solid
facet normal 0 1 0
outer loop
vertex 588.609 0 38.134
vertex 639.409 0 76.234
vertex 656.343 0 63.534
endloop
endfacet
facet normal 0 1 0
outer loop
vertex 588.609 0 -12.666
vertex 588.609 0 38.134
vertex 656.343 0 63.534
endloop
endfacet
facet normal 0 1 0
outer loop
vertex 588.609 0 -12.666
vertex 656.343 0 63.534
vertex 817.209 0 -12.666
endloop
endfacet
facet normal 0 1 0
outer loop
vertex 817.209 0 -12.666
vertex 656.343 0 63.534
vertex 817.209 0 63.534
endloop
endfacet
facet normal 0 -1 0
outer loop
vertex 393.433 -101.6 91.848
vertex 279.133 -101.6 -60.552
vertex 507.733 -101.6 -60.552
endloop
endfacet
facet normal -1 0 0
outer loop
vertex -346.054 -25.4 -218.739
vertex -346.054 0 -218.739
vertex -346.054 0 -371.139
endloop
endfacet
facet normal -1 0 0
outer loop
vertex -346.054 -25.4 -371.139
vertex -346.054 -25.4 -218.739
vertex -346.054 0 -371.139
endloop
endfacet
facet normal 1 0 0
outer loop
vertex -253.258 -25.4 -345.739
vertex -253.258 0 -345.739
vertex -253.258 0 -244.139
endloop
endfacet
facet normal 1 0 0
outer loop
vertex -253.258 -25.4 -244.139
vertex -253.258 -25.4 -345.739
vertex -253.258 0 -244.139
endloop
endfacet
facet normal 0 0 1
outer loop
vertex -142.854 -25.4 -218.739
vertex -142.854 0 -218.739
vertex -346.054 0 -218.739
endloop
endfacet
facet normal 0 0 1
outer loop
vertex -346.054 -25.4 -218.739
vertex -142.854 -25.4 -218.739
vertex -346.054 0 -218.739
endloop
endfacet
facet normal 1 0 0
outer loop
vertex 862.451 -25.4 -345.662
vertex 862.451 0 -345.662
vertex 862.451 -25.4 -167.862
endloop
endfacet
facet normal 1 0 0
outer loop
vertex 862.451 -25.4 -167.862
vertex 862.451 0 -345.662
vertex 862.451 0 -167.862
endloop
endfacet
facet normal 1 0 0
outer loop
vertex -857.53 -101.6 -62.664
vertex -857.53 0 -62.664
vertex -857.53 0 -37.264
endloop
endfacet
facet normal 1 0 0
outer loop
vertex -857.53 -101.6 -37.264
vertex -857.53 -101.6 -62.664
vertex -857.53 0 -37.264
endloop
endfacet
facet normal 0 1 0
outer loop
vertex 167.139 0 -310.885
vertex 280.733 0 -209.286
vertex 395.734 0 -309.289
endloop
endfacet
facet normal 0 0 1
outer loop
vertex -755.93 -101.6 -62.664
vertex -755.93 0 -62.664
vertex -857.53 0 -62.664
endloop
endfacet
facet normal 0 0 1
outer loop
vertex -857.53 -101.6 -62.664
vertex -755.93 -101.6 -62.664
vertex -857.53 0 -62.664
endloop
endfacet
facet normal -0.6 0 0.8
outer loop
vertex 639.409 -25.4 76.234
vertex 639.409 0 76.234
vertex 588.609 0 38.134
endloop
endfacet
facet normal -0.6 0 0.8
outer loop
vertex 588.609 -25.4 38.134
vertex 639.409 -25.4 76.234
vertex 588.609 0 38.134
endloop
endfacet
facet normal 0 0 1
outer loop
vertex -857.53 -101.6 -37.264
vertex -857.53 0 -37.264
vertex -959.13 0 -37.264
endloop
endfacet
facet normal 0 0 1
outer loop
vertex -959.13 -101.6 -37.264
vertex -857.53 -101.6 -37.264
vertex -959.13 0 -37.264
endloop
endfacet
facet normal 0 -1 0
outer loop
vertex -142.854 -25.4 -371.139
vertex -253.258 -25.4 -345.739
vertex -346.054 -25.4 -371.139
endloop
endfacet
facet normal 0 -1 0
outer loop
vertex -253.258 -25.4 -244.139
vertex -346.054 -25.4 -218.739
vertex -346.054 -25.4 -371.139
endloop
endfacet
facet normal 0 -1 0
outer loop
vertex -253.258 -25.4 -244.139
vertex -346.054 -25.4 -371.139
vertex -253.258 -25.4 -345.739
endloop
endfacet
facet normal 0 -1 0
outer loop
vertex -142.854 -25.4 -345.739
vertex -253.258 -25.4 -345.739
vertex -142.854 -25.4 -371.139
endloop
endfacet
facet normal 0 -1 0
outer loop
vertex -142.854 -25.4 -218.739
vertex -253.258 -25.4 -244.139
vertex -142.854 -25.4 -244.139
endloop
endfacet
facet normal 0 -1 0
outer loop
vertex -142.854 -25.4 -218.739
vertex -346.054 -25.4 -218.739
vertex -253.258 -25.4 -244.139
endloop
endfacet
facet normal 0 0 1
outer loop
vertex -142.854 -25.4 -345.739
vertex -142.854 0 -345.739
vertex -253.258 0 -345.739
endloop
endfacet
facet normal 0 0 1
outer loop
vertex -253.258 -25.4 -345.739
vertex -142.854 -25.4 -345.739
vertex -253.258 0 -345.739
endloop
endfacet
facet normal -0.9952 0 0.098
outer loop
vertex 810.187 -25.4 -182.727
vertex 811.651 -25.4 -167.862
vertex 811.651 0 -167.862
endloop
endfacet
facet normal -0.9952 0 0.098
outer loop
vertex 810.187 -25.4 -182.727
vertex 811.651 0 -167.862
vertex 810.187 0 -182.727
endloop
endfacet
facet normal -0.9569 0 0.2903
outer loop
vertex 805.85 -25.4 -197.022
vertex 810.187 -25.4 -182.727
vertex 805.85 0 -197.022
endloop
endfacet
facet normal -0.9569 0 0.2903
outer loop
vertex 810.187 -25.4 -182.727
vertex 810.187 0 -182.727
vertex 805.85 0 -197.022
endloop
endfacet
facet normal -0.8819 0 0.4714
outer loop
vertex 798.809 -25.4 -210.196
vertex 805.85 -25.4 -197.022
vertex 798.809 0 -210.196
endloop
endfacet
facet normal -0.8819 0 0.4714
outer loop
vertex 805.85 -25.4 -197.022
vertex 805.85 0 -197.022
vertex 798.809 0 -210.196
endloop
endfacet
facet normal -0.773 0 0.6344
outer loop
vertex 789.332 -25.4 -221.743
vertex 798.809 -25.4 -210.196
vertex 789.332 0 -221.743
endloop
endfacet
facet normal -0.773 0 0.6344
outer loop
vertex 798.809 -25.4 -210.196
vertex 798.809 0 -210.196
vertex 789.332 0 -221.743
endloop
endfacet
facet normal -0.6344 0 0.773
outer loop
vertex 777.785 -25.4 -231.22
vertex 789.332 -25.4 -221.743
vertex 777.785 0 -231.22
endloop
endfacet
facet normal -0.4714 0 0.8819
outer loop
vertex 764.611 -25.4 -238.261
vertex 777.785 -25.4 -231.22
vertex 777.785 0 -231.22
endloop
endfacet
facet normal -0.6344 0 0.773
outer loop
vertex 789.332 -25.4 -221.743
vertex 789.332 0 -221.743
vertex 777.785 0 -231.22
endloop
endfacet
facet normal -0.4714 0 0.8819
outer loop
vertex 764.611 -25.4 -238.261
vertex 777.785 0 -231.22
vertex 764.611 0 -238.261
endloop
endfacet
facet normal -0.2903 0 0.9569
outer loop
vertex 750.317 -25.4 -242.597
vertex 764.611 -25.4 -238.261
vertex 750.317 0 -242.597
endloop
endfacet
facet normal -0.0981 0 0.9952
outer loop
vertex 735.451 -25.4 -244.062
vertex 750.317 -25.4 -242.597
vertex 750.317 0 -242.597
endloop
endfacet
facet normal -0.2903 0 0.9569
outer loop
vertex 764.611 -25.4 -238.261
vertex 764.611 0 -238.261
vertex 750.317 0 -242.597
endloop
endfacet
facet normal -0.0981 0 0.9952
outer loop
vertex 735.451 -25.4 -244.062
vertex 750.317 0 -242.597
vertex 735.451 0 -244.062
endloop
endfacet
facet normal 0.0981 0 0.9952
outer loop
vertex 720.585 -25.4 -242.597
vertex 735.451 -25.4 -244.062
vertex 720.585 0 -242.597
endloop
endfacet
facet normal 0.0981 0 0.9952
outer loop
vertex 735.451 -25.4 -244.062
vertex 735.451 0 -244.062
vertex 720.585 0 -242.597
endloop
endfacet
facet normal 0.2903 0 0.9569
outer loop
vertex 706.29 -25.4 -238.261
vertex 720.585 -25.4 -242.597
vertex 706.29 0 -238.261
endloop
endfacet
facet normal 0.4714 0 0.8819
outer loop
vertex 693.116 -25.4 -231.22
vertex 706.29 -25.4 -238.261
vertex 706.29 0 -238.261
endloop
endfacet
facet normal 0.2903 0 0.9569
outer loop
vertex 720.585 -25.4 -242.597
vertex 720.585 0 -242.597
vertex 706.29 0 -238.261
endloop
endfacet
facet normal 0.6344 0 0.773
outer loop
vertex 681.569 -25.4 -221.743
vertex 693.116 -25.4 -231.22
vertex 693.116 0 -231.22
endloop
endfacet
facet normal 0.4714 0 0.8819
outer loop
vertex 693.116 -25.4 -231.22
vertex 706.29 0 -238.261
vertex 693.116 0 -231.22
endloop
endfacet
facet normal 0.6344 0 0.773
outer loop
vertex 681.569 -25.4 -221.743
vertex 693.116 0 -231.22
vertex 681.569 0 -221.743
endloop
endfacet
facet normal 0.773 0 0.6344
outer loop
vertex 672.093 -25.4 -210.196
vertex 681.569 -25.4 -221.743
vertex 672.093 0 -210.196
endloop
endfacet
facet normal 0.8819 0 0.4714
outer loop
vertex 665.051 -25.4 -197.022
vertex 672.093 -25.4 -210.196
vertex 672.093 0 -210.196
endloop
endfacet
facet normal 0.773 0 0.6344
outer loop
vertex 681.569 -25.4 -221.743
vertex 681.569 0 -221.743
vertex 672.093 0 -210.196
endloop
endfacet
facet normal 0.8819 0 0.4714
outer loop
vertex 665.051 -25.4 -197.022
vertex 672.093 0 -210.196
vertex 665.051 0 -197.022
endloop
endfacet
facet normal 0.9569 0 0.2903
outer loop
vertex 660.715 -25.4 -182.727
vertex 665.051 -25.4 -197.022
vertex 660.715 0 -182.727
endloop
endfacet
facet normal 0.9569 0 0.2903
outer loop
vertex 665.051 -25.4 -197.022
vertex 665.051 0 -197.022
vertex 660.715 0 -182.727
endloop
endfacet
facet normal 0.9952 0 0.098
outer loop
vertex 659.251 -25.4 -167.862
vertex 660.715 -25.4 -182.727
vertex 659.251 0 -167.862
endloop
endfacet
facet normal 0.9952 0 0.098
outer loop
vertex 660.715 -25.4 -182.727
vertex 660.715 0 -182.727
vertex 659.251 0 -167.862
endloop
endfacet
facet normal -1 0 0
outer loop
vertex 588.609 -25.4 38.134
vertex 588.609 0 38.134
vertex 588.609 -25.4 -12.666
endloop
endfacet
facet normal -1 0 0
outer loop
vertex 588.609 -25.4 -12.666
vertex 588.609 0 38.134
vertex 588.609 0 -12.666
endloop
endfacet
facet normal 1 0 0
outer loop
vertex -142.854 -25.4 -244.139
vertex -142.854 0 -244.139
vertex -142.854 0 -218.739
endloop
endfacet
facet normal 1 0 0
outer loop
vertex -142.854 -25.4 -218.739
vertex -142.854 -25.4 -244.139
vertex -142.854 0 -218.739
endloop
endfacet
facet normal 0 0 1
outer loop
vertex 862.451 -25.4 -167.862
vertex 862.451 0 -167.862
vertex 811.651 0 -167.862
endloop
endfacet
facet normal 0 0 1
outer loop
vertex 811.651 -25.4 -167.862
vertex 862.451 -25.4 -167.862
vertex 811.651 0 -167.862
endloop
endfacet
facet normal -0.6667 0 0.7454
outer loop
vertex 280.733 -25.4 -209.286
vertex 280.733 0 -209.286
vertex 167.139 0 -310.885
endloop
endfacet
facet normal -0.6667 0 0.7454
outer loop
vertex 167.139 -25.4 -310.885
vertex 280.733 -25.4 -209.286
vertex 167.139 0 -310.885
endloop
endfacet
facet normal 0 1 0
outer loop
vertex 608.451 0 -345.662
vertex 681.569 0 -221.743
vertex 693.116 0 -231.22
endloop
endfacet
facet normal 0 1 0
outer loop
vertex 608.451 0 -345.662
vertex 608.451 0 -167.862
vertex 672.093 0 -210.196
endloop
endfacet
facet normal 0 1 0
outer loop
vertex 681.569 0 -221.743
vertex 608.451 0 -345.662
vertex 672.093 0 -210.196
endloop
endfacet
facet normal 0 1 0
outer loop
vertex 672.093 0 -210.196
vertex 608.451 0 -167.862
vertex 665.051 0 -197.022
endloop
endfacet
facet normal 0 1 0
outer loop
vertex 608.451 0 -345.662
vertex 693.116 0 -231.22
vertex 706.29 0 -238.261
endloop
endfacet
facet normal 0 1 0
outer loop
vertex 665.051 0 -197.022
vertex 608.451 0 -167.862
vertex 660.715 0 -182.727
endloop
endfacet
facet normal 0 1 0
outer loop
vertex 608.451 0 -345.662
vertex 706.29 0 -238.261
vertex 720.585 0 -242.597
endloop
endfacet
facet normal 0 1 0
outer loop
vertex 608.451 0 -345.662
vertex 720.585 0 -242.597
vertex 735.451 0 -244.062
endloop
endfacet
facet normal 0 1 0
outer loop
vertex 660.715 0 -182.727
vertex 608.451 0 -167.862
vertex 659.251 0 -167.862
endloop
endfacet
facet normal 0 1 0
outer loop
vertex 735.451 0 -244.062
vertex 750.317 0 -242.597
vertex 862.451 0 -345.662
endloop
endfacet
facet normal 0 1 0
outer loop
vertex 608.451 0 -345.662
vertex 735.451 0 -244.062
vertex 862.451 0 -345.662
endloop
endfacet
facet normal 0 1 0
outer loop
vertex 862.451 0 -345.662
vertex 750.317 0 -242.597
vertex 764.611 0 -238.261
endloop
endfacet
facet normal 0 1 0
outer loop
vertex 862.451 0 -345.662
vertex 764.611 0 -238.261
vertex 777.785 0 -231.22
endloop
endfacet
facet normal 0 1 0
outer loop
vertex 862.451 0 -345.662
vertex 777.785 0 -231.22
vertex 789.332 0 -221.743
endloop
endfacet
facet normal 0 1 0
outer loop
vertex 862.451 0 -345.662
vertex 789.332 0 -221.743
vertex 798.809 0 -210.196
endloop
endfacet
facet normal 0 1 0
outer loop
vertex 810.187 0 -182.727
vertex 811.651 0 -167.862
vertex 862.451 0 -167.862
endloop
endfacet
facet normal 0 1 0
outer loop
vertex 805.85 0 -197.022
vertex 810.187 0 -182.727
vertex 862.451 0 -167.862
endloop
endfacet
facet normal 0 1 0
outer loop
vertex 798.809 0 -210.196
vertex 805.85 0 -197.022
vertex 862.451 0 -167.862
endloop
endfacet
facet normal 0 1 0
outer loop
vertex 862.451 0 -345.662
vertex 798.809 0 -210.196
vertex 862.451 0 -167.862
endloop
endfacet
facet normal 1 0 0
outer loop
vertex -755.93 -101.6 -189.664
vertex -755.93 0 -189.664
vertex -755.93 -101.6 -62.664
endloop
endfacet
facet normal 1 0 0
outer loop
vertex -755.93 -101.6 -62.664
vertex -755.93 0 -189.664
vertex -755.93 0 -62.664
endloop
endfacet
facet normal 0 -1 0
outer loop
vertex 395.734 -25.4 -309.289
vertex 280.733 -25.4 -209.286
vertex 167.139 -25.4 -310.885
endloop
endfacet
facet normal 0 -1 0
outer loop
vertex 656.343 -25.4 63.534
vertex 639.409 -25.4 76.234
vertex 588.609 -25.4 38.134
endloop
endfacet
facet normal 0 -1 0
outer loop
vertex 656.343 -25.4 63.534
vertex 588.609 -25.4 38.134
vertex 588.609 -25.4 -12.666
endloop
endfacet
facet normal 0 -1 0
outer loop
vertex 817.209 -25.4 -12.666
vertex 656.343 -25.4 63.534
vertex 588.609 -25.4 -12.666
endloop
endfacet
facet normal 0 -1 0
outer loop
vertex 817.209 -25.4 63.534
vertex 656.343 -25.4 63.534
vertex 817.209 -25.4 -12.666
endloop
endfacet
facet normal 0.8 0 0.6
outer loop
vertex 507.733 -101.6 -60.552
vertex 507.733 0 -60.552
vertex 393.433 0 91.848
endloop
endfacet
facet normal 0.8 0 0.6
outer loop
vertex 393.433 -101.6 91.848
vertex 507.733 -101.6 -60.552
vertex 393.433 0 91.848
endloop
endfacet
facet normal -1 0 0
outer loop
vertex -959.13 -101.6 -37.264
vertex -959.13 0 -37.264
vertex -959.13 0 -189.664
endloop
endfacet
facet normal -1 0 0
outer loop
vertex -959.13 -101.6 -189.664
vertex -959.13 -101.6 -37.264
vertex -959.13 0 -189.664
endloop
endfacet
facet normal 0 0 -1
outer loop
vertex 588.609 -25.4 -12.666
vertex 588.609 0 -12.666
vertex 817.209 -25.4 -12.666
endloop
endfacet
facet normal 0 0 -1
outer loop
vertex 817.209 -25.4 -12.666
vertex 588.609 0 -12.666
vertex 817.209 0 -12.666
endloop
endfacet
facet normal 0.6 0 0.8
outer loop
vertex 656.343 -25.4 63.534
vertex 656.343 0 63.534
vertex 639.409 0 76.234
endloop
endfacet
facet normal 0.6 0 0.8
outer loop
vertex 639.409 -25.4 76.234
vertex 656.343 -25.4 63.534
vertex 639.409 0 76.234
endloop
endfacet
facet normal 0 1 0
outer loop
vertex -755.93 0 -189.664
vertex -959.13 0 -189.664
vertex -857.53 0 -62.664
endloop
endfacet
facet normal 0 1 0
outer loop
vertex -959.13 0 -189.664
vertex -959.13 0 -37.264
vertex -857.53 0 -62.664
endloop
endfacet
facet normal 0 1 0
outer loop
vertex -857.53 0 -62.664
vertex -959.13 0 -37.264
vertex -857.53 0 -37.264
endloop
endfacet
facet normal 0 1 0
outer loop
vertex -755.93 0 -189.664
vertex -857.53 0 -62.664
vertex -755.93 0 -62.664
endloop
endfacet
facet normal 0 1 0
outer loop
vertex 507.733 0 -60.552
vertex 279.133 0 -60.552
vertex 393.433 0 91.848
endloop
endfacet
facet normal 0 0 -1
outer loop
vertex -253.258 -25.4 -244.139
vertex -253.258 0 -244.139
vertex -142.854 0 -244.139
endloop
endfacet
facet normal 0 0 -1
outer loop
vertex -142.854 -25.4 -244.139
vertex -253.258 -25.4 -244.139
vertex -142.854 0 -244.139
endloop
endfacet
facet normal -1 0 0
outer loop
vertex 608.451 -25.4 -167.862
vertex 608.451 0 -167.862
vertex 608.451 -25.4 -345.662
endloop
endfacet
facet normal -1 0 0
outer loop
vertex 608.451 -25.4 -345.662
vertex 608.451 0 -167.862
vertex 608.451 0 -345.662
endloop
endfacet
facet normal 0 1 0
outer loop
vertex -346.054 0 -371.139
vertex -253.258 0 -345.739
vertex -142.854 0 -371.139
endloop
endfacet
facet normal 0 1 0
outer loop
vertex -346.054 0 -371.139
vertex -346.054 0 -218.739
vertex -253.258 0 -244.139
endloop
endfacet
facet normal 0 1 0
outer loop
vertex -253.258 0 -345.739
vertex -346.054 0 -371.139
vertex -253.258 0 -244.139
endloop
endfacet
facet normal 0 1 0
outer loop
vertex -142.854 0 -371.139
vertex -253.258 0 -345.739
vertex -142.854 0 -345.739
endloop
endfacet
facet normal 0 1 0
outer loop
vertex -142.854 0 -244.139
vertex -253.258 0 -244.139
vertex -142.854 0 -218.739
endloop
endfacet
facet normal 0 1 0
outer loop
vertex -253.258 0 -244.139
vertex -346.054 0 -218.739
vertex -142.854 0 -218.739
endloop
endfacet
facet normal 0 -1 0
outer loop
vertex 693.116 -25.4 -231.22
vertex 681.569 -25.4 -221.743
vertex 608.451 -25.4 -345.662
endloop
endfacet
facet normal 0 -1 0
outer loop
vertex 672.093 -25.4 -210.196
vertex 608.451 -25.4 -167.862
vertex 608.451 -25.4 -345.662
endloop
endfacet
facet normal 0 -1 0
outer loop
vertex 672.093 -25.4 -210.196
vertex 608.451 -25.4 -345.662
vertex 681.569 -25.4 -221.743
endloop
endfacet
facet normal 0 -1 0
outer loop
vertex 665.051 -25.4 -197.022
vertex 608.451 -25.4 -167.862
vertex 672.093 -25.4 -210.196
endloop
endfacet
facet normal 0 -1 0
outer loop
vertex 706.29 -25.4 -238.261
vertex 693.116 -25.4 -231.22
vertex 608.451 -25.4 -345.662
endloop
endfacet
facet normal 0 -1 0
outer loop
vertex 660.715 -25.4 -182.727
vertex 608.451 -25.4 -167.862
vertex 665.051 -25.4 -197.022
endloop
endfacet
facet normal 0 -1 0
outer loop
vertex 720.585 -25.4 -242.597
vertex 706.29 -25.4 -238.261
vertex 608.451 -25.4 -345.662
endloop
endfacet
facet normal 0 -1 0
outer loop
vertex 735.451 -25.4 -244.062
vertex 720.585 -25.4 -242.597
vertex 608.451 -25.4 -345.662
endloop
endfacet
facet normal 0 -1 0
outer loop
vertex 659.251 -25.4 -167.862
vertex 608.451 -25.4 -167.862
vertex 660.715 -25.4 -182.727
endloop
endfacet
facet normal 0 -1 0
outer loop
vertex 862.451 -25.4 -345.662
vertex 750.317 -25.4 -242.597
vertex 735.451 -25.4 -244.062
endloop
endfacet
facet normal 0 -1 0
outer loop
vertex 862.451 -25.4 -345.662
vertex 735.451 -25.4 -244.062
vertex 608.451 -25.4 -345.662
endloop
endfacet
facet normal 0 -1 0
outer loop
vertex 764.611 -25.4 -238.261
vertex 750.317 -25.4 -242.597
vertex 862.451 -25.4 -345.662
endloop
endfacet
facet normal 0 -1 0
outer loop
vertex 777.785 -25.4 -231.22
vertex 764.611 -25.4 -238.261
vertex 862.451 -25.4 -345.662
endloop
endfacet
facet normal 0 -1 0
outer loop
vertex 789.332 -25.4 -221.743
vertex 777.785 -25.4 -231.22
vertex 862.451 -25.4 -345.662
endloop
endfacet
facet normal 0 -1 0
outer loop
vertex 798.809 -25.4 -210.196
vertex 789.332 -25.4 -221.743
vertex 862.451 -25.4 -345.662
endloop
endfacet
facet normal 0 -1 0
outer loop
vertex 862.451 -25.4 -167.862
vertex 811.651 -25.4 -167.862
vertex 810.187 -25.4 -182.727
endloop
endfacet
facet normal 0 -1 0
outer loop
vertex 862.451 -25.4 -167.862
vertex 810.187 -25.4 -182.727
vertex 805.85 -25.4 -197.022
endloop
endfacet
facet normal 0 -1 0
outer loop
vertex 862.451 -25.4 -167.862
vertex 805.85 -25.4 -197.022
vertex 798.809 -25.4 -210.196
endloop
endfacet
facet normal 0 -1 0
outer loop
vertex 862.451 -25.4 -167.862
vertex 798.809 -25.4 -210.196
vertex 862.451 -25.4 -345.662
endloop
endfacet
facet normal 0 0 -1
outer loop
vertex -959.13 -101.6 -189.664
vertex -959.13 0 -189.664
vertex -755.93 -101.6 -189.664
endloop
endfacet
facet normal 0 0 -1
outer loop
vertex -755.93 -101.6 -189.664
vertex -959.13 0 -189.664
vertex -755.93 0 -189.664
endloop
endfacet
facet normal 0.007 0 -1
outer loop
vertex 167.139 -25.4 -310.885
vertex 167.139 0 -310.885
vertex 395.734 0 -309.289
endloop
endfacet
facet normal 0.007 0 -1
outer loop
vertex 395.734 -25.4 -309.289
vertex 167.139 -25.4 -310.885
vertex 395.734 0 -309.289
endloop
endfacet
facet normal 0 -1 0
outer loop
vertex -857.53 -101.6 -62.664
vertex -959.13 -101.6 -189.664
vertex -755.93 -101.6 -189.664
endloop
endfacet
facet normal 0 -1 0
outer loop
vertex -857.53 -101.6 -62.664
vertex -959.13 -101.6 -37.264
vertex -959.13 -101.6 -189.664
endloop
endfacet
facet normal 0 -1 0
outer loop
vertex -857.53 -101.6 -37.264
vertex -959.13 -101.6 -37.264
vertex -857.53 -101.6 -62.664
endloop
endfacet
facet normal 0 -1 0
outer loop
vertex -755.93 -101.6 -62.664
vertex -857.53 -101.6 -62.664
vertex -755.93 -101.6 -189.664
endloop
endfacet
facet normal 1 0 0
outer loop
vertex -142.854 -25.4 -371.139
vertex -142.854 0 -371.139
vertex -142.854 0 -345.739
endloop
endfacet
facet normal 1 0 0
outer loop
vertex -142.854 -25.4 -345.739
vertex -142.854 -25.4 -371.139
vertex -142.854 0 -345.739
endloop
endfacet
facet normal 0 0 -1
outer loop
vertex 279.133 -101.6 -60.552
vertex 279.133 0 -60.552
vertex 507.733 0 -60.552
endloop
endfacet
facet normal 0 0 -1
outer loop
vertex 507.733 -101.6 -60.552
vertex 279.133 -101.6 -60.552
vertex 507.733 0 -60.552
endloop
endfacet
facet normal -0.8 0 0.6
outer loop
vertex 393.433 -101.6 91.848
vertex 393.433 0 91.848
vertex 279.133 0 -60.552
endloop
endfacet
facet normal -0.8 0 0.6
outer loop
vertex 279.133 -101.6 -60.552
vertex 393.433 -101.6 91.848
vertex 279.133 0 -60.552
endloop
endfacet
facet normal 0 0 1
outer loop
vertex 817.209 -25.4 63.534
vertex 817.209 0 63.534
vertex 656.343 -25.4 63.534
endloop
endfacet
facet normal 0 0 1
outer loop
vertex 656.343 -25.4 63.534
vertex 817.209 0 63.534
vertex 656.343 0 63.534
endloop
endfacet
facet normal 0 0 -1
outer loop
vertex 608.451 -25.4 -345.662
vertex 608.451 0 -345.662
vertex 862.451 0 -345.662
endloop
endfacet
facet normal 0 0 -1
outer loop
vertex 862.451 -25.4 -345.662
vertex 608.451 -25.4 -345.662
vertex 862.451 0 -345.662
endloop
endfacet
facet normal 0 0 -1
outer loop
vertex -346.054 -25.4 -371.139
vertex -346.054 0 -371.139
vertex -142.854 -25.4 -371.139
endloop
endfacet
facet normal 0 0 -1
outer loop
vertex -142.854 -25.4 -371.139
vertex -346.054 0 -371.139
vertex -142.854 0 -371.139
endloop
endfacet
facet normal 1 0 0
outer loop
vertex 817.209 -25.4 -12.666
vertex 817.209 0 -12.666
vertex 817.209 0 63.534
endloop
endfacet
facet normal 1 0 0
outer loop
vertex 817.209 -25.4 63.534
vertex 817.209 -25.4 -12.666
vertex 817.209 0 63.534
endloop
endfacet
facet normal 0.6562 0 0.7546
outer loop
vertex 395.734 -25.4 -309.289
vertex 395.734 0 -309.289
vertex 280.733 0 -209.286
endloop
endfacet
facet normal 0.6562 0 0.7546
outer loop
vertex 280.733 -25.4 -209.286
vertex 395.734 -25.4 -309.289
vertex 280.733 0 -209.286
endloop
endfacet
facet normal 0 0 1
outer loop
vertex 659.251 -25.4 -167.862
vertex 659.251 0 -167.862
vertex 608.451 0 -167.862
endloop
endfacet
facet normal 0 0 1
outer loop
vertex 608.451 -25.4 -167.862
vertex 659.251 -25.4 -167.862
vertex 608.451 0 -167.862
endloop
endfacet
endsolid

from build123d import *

# Parameters (mm, degrees)
F1_DEPTH  = 101.6
F4_DEPTH  = 101.6
F6_DEPTH  = 25.4
F8_DEPTH  = 25.4
F2_W      = 127
F2_H      = 50.8
F9_DEPTH  = 25.4
F11_DEPTH = 25.4


with BuildPart() as f1:
    # F0 (on Front) → F1 (new body)
    with BuildSketch(Plane.XZ):
        Polygon((336.283034, 15.647688), (279.133034, -60.552312), (507.733034, -60.552312), (450.583034, 15.647688), align=None)
        Polygon((393.433034, 91.847688), (336.283034, 15.647688), (450.583034, 15.647688), align=None)
    extrude(amount=F1_DEPTH)


with BuildPart() as f4:
    # F3 (on Front) → F4 (new body)
    with BuildSketch(Plane.XZ):
        Polygon((-959.129759, -189.663569), (-755.929759, -189.663569), (-755.929759, -62.663569), (-857.529759, -62.663569), (-857.529759, -37.263569), (-959.129759, -37.263569), align=None)
    extrude(amount=F4_DEPTH)


with BuildPart() as f6:
    # F5 (on Front) → F6 (new body)
    with BuildSketch(Plane.XZ):
        Polygon((-346.053687, -371.139194), (-142.853687, -371.139194), (-142.853687, -345.739194), (-253.257602, -345.739194), (-253.257602, -244.139194), (-142.853687, -244.139194), (-142.853687, -218.739194), (-346.053687, -218.739194), align=None)
    extrude(amount=F6_DEPTH)


with BuildPart() as f8:
    # F7 (on Front) → F8 (new body)
    with BuildSketch(Plane.XZ):
        with BuildLine():
            Line((608.450864, -345.661539), (862.450864, -345.661539))
            Line((862.450864, -345.661539), (862.450864, -167.861539))
            Line((862.450864, -167.861539), (811.650864, -167.861539))
            ThreePointArc((811.650864, -167.861539), (735.450864, -244.061539), (659.250864, -167.861539))
            Line((659.250864, -167.861539), (608.450864, -167.861539))
            Line((608.450864, -167.861539), (608.450864, -345.661539))
        make_face()
    extrude(amount=F8_DEPTH)


with BuildPart() as f9:
    # F2 (on Front) → F9 (new body)
    with BuildSketch(Plane.XZ):
        Polygon((588.609278, -12.66572), (690.209278, -12.66572), (690.209278, 38.13428), (656.342612, 63.53428), (639.409278, 76.23428), (588.609278, 38.13428), align=None)
        with Locations((753.709278, 12.73428)):
            Rectangle(F2_W, F2_H)
        Polygon((690.209278, 38.13428), (817.209278, 38.13428), (817.209278, 63.53428), (656.342612, 63.53428), align=None)
    extrude(amount=F9_DEPTH)


with BuildPart() as f11:
    # F10 (on Front) → F11 (new body)
    with BuildSketch(Plane.XZ):
        Polygon((280.732538, -209.286173), (167.139215, -310.884977), (395.733642, -309.288705), align=None)
    extrude(amount=F11_DEPTH)


solid = Compound([f1.part, f4.part, f6.part, f8.part, f9.part, f11.part])
